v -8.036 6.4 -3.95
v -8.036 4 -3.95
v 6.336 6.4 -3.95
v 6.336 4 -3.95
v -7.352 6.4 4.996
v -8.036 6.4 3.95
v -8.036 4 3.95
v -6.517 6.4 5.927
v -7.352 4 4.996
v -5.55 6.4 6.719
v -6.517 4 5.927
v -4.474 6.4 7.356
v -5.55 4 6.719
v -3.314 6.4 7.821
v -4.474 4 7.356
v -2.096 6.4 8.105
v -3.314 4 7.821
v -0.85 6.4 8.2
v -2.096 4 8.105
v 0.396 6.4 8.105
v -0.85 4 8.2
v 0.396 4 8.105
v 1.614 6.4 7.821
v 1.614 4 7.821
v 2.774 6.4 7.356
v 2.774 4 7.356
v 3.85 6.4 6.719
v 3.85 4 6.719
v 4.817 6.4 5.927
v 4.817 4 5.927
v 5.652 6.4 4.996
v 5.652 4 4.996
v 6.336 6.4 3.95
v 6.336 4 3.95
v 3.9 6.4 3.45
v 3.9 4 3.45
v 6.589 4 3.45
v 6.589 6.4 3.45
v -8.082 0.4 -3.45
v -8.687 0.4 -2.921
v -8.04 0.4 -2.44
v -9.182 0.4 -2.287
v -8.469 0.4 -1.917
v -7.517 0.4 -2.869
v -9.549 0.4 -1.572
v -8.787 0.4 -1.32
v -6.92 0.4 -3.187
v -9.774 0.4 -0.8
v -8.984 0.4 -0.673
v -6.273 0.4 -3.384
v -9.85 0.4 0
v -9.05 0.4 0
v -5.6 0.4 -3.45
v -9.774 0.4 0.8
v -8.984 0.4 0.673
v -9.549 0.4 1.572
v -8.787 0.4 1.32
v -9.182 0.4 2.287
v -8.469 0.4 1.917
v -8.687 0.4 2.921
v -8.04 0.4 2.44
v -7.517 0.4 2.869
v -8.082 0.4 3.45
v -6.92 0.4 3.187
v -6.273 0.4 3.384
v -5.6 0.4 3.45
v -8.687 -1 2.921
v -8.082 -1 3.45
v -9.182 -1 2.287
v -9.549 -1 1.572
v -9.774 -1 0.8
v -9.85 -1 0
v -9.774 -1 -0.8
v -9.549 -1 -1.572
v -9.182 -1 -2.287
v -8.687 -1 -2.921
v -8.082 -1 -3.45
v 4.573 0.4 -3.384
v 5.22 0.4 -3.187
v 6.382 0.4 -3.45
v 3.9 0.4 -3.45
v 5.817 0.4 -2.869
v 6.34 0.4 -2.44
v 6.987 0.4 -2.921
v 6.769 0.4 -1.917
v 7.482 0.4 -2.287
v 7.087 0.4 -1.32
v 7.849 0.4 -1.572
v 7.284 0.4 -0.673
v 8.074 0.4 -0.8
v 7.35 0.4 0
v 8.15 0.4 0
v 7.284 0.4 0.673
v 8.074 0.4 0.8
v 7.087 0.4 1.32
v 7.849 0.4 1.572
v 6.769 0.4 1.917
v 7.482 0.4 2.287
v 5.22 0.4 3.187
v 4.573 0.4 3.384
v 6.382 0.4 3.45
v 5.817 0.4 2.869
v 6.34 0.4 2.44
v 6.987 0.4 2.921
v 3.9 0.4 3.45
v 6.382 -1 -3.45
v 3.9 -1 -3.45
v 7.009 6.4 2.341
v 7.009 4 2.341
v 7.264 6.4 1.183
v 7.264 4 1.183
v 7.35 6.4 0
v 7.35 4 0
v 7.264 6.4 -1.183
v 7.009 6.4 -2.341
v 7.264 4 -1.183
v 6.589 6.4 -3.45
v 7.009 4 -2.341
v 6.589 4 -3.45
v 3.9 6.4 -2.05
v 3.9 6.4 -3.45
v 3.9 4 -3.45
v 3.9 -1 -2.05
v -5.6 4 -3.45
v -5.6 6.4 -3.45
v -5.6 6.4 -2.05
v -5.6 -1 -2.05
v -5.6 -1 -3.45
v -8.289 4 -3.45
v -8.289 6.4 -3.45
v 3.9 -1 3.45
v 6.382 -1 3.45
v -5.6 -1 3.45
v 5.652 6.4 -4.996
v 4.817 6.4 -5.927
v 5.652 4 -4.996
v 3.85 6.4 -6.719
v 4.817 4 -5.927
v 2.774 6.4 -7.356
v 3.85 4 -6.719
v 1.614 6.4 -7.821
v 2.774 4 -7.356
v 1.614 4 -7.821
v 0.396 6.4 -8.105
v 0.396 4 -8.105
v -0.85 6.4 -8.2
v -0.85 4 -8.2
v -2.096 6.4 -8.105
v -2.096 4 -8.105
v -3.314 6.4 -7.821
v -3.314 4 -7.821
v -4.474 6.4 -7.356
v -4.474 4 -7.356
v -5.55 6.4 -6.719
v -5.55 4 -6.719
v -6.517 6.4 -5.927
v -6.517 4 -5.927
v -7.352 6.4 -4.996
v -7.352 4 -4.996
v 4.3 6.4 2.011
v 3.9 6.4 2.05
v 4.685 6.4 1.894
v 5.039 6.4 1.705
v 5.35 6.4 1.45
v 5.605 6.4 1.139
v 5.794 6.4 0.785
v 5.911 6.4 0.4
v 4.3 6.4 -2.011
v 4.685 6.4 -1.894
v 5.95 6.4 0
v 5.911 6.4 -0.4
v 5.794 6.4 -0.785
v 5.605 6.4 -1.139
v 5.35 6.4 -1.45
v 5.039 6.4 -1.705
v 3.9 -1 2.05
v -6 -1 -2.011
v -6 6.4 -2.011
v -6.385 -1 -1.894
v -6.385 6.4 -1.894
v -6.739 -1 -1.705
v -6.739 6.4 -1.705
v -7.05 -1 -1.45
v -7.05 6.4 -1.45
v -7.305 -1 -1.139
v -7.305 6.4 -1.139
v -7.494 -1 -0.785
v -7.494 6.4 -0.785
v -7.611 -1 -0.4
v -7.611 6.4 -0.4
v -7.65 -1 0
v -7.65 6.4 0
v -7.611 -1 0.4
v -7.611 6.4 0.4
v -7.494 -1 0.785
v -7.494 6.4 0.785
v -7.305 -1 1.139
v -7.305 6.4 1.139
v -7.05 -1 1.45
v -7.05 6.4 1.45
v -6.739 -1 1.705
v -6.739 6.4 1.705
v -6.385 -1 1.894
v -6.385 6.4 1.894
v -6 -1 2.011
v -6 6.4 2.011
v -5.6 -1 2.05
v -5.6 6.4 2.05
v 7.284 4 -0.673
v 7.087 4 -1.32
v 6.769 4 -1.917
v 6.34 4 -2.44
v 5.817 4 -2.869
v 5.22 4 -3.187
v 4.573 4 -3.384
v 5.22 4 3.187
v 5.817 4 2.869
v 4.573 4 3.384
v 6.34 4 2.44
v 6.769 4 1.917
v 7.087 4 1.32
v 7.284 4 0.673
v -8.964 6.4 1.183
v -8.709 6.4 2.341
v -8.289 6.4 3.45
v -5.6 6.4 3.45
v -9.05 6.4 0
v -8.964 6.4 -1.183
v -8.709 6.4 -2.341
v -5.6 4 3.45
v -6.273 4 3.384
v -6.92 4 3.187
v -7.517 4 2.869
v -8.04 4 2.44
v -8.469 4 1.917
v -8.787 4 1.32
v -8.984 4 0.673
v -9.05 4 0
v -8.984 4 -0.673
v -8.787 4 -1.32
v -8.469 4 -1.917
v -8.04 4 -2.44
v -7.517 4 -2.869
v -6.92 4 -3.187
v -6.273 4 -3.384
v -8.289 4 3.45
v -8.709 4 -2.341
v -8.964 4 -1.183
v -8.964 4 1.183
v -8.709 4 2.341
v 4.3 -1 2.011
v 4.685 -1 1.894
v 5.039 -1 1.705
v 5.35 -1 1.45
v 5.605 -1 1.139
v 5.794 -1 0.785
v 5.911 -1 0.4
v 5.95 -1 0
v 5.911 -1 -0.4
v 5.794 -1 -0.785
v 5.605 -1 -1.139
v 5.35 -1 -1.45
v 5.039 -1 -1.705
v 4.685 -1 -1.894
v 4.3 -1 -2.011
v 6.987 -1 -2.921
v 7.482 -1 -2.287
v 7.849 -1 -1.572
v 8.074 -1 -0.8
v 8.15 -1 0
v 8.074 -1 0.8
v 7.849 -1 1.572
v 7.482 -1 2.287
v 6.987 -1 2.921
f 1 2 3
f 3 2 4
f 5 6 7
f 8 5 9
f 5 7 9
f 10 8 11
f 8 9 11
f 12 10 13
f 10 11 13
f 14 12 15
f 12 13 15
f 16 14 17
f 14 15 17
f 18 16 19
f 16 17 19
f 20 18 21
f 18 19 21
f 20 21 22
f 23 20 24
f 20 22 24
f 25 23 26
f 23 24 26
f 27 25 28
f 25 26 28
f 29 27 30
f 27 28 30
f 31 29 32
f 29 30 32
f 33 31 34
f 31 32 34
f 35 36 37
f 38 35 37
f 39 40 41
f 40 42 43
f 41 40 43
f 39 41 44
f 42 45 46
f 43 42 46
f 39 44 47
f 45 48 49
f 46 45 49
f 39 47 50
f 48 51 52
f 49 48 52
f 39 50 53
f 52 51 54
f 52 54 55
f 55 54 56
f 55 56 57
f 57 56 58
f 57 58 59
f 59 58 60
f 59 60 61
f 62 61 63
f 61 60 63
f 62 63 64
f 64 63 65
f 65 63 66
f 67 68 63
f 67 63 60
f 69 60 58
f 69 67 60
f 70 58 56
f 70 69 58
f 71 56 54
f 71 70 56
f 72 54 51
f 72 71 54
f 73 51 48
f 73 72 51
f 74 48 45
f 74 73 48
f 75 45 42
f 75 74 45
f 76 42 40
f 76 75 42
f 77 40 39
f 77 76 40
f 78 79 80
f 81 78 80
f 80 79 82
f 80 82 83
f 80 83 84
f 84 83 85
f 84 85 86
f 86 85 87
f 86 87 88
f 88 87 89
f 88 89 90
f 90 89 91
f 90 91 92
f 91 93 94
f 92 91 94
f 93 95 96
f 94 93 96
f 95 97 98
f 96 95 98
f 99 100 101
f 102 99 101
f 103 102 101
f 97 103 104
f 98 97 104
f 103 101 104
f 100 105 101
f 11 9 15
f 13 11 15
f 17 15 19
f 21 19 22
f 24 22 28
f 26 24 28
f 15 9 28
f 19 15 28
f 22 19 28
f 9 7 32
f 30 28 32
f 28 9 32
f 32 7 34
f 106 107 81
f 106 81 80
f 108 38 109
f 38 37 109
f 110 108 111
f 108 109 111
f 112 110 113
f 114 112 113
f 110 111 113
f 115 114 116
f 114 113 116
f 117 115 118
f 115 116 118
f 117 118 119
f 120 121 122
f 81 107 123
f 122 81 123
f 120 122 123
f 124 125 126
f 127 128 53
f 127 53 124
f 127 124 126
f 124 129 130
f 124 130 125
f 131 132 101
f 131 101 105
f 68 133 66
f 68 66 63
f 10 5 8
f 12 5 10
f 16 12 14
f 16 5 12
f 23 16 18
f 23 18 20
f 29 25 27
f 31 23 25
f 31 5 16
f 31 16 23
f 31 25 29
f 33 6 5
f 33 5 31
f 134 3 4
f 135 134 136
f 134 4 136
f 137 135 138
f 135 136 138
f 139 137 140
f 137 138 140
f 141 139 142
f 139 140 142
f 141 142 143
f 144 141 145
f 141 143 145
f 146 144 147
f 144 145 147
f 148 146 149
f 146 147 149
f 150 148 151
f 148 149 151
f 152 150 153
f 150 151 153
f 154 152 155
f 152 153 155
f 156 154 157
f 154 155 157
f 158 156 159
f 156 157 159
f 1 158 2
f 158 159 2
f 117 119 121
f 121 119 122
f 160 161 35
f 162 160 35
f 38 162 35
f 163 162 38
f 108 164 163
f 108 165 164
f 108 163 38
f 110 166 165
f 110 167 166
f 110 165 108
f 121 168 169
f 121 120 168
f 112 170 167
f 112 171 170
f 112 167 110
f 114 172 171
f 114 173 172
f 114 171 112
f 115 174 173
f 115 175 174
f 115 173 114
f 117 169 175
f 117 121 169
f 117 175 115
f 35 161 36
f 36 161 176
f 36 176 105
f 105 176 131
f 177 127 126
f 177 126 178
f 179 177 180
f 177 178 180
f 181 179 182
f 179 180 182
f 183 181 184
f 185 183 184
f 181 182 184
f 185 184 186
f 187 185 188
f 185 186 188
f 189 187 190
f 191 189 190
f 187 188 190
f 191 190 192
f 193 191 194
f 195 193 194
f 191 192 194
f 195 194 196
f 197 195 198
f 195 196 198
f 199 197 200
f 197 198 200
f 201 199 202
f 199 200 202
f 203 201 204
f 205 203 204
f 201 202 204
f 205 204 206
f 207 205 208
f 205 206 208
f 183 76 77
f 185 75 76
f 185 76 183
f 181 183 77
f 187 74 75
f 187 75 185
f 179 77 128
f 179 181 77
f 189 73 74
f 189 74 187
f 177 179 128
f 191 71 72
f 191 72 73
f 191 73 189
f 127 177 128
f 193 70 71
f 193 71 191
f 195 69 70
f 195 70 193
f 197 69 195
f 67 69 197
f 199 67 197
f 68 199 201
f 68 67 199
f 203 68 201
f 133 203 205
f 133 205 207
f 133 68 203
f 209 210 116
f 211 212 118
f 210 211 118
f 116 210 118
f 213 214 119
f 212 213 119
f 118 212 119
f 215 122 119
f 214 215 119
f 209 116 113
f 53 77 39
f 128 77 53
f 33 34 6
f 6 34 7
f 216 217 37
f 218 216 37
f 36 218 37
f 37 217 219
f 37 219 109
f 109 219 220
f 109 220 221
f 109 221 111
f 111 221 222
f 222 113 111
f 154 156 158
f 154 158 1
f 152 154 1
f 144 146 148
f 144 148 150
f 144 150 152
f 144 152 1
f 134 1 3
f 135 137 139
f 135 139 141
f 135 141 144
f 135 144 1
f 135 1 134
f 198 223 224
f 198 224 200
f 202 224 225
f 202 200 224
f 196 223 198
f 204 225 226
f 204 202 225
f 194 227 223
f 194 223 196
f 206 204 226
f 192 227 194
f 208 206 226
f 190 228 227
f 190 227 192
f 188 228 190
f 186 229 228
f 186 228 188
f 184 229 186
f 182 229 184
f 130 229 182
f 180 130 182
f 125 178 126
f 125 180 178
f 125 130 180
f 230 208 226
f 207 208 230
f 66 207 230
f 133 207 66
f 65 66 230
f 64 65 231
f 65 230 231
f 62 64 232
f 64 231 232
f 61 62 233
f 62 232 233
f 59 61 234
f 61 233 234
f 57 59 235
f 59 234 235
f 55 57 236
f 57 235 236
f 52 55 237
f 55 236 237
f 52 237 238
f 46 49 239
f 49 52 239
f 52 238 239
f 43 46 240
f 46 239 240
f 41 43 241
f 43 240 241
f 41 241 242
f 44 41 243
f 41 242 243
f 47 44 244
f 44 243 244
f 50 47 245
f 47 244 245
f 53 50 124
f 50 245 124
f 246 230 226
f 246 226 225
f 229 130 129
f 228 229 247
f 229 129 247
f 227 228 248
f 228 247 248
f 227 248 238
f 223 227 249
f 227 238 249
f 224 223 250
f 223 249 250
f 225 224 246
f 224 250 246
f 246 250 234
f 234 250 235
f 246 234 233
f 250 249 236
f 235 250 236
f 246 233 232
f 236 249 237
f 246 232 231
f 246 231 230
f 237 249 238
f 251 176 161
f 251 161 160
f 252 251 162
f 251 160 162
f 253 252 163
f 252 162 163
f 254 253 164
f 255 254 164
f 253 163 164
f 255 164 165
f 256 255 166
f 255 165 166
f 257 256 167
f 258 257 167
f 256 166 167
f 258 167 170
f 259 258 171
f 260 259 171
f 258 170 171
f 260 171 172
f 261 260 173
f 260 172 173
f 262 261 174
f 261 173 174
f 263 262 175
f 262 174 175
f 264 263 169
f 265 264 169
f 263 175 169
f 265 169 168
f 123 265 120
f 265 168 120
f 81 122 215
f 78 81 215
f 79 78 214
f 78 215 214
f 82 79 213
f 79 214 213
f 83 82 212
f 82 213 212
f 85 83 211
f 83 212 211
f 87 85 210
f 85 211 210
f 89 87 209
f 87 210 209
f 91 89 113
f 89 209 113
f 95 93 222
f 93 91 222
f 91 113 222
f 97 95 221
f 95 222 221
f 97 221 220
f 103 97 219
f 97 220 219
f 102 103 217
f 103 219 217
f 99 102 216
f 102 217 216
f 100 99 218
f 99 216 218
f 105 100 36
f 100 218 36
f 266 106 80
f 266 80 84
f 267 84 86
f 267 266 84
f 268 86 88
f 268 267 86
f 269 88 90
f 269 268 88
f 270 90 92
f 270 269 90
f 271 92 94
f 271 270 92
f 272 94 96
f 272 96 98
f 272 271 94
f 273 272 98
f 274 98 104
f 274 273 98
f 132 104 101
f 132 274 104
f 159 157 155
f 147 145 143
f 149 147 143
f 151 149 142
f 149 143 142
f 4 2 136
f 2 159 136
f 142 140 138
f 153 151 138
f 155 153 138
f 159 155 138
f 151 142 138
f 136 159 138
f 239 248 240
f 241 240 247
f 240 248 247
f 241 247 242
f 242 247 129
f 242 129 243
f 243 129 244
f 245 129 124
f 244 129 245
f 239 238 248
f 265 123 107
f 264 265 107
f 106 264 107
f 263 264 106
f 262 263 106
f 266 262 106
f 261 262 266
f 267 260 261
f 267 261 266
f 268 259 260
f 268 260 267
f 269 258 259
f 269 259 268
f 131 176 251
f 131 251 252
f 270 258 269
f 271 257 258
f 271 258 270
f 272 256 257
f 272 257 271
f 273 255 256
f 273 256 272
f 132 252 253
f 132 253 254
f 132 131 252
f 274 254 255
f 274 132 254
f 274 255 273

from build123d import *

# Parameters (mm, degrees)
EXTRUDE_1_DEPTH     = 4
SKETCH_2_R          = 8.2
EXTRUDE_2_DEPTH     = 2.4
EXTRUDE_3_DEPTH     = 1
EXTRUDE_4_DEPTH     = 1.4
CUT_EXTRUDE_1_DEPTH = 7.4
SKETCH_13_W         = 8.5
SKETCH_13_H         = 1.9
CUT_EXTRUDE_2_DEPTH = 7.4


with BuildPart() as part:
    # ｽｹｯﾁ1 → ﾎﾞｽ - 押し出し1 (new body)
    with BuildSketch(Plane(origin=(0, 0, 0), x_dir=(1, 0, 0), z_dir=(0, 1, 0))):
        with BuildLine():
            Line((-5.6, 3.45), (3.9, 3.45))
            ThreePointArc((3.9, 3.45), (7.35, 0), (3.9, -3.45))
            Line((3.9, -3.45), (-5.6, -3.45))
            ThreePointArc((-5.6, -3.45), (-9.05, 0), (-5.6, 3.45))
        make_face()
        with BuildLine():
            Line((-5.6, 2.05), (3.9, 2.05))
            ThreePointArc((3.9, 2.05), (5.95, 0), (3.9, -2.05))
            Line((3.9, -2.05), (-5.6, -2.05))
            ThreePointArc((-5.6, -2.05), (-7.65, 0), (-5.6, 2.05))
        make_face(mode=Mode.SUBTRACT)
    extrude(amount=EXTRUDE_1_DEPTH)

    # ｽｹｯﾁ2 → ﾎﾞｽ - 押し出し2 (add)
    with BuildSketch(Plane(origin=(0, 4, 0), x_dir=(1, 0, 0), z_dir=(0, 1, 0))):
        with Locations((-0.85, 0)):
            Circle(SKETCH_2_R)
        with BuildLine():
            Line((-5.6, -2.05), (3.9, -2.05))
            ThreePointArc((3.9, -2.05), (5.95, 0), (3.9, 2.05))
            Line((3.9, 2.05), (-5.6, 2.05))
            ThreePointArc((-5.6, 2.05), (-7.65, 0), (-5.6, -2.05))
        make_face(mode=Mode.SUBTRACT)
    extrude(amount=EXTRUDE_2_DEPTH)

    # ｽｹｯﾁ3 → ﾎﾞｽ - 押し出し3 (add)
    with BuildSketch(Plane.XZ):
        with BuildLine():
            Line((-5.6, -3.45), (3.9, -3.45))
            ThreePointArc((3.9, -3.45), (7.35, 0), (3.9, 3.45))
            Line((3.9, 3.45), (-5.6, 3.45))
            ThreePointArc((-5.6, 3.45), (-9.05, 0), (-5.6, -3.45))
        make_face()
        with BuildLine():
            Line((-5.6, 2.05), (3.9, 2.05))
            ThreePointArc((3.9, 2.05), (5.95, 0), (3.9, -2.05))
            Line((3.9, -2.05), (-5.6, -2.05))
            ThreePointArc((-5.6, -2.05), (-7.65, 0), (-5.6, 2.05))
        make_face(mode=Mode.SUBTRACT)
    extrude(amount=EXTRUDE_3_DEPTH)

    # ｽｹｯﾁ4 → ﾎﾞｽ - 押し出し4 (add)
    with BuildSketch(Plane.XZ.offset(1)):
        with BuildLine():
            Line((3.9, -3.45), (6.381934729, -3.45))
            ThreePointArc((6.381934729, -3.45), (8.15, 0), (6.381934729, 3.45))
            Line((6.381934729, 3.45), (3.9, 3.45))
            ThreePointArc((3.9, 3.45), (7.35, 0), (3.9, -3.45))
        make_face()
        with BuildLine():
            Line((-5.6, 3.45), (-8.081934729, 3.45))
            ThreePointArc((-8.081934729, 3.45), (-9.85, 0), (-8.081934729, -3.45))
            Line((-8.081934729, -3.45), (-5.6, -3.45))
            ThreePointArc((-5.6, -3.45), (-9.05, 0), (-5.6, 3.45))
        make_face()
    extrude(amount=-EXTRUDE_4_DEPTH)

    # ｽｹｯﾁ12 → ｶｯﾄ - 押し出し1 (cut)
    with BuildSketch(Plane.XZ.offset(1)):
        Polygon((-5.1, 3.95), (-5.1, -3.95), (-14.4591774, -3.95), (-14.4591774, -3.45), (-5.6, -3.45), (-5.6, 3.45), (-14.4591774, 3.45), (-14.4591774, 3.95), align=None)
        Polygon((12.7591774, 3.45), (12.7591774, 3.95), (3.4, 3.95), (3.4, -3.95), (12.7591774, -3.95), (12.7591774, -3.45), (3.9, -3.45), (3.9, 3.45), align=None)
    extrude(amount=-CUT_EXTRUDE_1_DEPTH, mode=Mode.SUBTRACT)

    # ｽｹｯﾁ13 → ｶｯﾄ - 押し出し2 (cut)
    with BuildSketch(Plane.XZ.offset(1)):
        with Locations((-0.85, 3)):
            Rectangle(SKETCH_13_W, SKETCH_13_H)
        with Locations((-0.85, -3)):
            Rectangle(SKETCH_13_W, SKETCH_13_H)
    extrude(amount=-CUT_EXTRUDE_2_DEPTH, mode=Mode.SUBTRACT)


solid = part.part
